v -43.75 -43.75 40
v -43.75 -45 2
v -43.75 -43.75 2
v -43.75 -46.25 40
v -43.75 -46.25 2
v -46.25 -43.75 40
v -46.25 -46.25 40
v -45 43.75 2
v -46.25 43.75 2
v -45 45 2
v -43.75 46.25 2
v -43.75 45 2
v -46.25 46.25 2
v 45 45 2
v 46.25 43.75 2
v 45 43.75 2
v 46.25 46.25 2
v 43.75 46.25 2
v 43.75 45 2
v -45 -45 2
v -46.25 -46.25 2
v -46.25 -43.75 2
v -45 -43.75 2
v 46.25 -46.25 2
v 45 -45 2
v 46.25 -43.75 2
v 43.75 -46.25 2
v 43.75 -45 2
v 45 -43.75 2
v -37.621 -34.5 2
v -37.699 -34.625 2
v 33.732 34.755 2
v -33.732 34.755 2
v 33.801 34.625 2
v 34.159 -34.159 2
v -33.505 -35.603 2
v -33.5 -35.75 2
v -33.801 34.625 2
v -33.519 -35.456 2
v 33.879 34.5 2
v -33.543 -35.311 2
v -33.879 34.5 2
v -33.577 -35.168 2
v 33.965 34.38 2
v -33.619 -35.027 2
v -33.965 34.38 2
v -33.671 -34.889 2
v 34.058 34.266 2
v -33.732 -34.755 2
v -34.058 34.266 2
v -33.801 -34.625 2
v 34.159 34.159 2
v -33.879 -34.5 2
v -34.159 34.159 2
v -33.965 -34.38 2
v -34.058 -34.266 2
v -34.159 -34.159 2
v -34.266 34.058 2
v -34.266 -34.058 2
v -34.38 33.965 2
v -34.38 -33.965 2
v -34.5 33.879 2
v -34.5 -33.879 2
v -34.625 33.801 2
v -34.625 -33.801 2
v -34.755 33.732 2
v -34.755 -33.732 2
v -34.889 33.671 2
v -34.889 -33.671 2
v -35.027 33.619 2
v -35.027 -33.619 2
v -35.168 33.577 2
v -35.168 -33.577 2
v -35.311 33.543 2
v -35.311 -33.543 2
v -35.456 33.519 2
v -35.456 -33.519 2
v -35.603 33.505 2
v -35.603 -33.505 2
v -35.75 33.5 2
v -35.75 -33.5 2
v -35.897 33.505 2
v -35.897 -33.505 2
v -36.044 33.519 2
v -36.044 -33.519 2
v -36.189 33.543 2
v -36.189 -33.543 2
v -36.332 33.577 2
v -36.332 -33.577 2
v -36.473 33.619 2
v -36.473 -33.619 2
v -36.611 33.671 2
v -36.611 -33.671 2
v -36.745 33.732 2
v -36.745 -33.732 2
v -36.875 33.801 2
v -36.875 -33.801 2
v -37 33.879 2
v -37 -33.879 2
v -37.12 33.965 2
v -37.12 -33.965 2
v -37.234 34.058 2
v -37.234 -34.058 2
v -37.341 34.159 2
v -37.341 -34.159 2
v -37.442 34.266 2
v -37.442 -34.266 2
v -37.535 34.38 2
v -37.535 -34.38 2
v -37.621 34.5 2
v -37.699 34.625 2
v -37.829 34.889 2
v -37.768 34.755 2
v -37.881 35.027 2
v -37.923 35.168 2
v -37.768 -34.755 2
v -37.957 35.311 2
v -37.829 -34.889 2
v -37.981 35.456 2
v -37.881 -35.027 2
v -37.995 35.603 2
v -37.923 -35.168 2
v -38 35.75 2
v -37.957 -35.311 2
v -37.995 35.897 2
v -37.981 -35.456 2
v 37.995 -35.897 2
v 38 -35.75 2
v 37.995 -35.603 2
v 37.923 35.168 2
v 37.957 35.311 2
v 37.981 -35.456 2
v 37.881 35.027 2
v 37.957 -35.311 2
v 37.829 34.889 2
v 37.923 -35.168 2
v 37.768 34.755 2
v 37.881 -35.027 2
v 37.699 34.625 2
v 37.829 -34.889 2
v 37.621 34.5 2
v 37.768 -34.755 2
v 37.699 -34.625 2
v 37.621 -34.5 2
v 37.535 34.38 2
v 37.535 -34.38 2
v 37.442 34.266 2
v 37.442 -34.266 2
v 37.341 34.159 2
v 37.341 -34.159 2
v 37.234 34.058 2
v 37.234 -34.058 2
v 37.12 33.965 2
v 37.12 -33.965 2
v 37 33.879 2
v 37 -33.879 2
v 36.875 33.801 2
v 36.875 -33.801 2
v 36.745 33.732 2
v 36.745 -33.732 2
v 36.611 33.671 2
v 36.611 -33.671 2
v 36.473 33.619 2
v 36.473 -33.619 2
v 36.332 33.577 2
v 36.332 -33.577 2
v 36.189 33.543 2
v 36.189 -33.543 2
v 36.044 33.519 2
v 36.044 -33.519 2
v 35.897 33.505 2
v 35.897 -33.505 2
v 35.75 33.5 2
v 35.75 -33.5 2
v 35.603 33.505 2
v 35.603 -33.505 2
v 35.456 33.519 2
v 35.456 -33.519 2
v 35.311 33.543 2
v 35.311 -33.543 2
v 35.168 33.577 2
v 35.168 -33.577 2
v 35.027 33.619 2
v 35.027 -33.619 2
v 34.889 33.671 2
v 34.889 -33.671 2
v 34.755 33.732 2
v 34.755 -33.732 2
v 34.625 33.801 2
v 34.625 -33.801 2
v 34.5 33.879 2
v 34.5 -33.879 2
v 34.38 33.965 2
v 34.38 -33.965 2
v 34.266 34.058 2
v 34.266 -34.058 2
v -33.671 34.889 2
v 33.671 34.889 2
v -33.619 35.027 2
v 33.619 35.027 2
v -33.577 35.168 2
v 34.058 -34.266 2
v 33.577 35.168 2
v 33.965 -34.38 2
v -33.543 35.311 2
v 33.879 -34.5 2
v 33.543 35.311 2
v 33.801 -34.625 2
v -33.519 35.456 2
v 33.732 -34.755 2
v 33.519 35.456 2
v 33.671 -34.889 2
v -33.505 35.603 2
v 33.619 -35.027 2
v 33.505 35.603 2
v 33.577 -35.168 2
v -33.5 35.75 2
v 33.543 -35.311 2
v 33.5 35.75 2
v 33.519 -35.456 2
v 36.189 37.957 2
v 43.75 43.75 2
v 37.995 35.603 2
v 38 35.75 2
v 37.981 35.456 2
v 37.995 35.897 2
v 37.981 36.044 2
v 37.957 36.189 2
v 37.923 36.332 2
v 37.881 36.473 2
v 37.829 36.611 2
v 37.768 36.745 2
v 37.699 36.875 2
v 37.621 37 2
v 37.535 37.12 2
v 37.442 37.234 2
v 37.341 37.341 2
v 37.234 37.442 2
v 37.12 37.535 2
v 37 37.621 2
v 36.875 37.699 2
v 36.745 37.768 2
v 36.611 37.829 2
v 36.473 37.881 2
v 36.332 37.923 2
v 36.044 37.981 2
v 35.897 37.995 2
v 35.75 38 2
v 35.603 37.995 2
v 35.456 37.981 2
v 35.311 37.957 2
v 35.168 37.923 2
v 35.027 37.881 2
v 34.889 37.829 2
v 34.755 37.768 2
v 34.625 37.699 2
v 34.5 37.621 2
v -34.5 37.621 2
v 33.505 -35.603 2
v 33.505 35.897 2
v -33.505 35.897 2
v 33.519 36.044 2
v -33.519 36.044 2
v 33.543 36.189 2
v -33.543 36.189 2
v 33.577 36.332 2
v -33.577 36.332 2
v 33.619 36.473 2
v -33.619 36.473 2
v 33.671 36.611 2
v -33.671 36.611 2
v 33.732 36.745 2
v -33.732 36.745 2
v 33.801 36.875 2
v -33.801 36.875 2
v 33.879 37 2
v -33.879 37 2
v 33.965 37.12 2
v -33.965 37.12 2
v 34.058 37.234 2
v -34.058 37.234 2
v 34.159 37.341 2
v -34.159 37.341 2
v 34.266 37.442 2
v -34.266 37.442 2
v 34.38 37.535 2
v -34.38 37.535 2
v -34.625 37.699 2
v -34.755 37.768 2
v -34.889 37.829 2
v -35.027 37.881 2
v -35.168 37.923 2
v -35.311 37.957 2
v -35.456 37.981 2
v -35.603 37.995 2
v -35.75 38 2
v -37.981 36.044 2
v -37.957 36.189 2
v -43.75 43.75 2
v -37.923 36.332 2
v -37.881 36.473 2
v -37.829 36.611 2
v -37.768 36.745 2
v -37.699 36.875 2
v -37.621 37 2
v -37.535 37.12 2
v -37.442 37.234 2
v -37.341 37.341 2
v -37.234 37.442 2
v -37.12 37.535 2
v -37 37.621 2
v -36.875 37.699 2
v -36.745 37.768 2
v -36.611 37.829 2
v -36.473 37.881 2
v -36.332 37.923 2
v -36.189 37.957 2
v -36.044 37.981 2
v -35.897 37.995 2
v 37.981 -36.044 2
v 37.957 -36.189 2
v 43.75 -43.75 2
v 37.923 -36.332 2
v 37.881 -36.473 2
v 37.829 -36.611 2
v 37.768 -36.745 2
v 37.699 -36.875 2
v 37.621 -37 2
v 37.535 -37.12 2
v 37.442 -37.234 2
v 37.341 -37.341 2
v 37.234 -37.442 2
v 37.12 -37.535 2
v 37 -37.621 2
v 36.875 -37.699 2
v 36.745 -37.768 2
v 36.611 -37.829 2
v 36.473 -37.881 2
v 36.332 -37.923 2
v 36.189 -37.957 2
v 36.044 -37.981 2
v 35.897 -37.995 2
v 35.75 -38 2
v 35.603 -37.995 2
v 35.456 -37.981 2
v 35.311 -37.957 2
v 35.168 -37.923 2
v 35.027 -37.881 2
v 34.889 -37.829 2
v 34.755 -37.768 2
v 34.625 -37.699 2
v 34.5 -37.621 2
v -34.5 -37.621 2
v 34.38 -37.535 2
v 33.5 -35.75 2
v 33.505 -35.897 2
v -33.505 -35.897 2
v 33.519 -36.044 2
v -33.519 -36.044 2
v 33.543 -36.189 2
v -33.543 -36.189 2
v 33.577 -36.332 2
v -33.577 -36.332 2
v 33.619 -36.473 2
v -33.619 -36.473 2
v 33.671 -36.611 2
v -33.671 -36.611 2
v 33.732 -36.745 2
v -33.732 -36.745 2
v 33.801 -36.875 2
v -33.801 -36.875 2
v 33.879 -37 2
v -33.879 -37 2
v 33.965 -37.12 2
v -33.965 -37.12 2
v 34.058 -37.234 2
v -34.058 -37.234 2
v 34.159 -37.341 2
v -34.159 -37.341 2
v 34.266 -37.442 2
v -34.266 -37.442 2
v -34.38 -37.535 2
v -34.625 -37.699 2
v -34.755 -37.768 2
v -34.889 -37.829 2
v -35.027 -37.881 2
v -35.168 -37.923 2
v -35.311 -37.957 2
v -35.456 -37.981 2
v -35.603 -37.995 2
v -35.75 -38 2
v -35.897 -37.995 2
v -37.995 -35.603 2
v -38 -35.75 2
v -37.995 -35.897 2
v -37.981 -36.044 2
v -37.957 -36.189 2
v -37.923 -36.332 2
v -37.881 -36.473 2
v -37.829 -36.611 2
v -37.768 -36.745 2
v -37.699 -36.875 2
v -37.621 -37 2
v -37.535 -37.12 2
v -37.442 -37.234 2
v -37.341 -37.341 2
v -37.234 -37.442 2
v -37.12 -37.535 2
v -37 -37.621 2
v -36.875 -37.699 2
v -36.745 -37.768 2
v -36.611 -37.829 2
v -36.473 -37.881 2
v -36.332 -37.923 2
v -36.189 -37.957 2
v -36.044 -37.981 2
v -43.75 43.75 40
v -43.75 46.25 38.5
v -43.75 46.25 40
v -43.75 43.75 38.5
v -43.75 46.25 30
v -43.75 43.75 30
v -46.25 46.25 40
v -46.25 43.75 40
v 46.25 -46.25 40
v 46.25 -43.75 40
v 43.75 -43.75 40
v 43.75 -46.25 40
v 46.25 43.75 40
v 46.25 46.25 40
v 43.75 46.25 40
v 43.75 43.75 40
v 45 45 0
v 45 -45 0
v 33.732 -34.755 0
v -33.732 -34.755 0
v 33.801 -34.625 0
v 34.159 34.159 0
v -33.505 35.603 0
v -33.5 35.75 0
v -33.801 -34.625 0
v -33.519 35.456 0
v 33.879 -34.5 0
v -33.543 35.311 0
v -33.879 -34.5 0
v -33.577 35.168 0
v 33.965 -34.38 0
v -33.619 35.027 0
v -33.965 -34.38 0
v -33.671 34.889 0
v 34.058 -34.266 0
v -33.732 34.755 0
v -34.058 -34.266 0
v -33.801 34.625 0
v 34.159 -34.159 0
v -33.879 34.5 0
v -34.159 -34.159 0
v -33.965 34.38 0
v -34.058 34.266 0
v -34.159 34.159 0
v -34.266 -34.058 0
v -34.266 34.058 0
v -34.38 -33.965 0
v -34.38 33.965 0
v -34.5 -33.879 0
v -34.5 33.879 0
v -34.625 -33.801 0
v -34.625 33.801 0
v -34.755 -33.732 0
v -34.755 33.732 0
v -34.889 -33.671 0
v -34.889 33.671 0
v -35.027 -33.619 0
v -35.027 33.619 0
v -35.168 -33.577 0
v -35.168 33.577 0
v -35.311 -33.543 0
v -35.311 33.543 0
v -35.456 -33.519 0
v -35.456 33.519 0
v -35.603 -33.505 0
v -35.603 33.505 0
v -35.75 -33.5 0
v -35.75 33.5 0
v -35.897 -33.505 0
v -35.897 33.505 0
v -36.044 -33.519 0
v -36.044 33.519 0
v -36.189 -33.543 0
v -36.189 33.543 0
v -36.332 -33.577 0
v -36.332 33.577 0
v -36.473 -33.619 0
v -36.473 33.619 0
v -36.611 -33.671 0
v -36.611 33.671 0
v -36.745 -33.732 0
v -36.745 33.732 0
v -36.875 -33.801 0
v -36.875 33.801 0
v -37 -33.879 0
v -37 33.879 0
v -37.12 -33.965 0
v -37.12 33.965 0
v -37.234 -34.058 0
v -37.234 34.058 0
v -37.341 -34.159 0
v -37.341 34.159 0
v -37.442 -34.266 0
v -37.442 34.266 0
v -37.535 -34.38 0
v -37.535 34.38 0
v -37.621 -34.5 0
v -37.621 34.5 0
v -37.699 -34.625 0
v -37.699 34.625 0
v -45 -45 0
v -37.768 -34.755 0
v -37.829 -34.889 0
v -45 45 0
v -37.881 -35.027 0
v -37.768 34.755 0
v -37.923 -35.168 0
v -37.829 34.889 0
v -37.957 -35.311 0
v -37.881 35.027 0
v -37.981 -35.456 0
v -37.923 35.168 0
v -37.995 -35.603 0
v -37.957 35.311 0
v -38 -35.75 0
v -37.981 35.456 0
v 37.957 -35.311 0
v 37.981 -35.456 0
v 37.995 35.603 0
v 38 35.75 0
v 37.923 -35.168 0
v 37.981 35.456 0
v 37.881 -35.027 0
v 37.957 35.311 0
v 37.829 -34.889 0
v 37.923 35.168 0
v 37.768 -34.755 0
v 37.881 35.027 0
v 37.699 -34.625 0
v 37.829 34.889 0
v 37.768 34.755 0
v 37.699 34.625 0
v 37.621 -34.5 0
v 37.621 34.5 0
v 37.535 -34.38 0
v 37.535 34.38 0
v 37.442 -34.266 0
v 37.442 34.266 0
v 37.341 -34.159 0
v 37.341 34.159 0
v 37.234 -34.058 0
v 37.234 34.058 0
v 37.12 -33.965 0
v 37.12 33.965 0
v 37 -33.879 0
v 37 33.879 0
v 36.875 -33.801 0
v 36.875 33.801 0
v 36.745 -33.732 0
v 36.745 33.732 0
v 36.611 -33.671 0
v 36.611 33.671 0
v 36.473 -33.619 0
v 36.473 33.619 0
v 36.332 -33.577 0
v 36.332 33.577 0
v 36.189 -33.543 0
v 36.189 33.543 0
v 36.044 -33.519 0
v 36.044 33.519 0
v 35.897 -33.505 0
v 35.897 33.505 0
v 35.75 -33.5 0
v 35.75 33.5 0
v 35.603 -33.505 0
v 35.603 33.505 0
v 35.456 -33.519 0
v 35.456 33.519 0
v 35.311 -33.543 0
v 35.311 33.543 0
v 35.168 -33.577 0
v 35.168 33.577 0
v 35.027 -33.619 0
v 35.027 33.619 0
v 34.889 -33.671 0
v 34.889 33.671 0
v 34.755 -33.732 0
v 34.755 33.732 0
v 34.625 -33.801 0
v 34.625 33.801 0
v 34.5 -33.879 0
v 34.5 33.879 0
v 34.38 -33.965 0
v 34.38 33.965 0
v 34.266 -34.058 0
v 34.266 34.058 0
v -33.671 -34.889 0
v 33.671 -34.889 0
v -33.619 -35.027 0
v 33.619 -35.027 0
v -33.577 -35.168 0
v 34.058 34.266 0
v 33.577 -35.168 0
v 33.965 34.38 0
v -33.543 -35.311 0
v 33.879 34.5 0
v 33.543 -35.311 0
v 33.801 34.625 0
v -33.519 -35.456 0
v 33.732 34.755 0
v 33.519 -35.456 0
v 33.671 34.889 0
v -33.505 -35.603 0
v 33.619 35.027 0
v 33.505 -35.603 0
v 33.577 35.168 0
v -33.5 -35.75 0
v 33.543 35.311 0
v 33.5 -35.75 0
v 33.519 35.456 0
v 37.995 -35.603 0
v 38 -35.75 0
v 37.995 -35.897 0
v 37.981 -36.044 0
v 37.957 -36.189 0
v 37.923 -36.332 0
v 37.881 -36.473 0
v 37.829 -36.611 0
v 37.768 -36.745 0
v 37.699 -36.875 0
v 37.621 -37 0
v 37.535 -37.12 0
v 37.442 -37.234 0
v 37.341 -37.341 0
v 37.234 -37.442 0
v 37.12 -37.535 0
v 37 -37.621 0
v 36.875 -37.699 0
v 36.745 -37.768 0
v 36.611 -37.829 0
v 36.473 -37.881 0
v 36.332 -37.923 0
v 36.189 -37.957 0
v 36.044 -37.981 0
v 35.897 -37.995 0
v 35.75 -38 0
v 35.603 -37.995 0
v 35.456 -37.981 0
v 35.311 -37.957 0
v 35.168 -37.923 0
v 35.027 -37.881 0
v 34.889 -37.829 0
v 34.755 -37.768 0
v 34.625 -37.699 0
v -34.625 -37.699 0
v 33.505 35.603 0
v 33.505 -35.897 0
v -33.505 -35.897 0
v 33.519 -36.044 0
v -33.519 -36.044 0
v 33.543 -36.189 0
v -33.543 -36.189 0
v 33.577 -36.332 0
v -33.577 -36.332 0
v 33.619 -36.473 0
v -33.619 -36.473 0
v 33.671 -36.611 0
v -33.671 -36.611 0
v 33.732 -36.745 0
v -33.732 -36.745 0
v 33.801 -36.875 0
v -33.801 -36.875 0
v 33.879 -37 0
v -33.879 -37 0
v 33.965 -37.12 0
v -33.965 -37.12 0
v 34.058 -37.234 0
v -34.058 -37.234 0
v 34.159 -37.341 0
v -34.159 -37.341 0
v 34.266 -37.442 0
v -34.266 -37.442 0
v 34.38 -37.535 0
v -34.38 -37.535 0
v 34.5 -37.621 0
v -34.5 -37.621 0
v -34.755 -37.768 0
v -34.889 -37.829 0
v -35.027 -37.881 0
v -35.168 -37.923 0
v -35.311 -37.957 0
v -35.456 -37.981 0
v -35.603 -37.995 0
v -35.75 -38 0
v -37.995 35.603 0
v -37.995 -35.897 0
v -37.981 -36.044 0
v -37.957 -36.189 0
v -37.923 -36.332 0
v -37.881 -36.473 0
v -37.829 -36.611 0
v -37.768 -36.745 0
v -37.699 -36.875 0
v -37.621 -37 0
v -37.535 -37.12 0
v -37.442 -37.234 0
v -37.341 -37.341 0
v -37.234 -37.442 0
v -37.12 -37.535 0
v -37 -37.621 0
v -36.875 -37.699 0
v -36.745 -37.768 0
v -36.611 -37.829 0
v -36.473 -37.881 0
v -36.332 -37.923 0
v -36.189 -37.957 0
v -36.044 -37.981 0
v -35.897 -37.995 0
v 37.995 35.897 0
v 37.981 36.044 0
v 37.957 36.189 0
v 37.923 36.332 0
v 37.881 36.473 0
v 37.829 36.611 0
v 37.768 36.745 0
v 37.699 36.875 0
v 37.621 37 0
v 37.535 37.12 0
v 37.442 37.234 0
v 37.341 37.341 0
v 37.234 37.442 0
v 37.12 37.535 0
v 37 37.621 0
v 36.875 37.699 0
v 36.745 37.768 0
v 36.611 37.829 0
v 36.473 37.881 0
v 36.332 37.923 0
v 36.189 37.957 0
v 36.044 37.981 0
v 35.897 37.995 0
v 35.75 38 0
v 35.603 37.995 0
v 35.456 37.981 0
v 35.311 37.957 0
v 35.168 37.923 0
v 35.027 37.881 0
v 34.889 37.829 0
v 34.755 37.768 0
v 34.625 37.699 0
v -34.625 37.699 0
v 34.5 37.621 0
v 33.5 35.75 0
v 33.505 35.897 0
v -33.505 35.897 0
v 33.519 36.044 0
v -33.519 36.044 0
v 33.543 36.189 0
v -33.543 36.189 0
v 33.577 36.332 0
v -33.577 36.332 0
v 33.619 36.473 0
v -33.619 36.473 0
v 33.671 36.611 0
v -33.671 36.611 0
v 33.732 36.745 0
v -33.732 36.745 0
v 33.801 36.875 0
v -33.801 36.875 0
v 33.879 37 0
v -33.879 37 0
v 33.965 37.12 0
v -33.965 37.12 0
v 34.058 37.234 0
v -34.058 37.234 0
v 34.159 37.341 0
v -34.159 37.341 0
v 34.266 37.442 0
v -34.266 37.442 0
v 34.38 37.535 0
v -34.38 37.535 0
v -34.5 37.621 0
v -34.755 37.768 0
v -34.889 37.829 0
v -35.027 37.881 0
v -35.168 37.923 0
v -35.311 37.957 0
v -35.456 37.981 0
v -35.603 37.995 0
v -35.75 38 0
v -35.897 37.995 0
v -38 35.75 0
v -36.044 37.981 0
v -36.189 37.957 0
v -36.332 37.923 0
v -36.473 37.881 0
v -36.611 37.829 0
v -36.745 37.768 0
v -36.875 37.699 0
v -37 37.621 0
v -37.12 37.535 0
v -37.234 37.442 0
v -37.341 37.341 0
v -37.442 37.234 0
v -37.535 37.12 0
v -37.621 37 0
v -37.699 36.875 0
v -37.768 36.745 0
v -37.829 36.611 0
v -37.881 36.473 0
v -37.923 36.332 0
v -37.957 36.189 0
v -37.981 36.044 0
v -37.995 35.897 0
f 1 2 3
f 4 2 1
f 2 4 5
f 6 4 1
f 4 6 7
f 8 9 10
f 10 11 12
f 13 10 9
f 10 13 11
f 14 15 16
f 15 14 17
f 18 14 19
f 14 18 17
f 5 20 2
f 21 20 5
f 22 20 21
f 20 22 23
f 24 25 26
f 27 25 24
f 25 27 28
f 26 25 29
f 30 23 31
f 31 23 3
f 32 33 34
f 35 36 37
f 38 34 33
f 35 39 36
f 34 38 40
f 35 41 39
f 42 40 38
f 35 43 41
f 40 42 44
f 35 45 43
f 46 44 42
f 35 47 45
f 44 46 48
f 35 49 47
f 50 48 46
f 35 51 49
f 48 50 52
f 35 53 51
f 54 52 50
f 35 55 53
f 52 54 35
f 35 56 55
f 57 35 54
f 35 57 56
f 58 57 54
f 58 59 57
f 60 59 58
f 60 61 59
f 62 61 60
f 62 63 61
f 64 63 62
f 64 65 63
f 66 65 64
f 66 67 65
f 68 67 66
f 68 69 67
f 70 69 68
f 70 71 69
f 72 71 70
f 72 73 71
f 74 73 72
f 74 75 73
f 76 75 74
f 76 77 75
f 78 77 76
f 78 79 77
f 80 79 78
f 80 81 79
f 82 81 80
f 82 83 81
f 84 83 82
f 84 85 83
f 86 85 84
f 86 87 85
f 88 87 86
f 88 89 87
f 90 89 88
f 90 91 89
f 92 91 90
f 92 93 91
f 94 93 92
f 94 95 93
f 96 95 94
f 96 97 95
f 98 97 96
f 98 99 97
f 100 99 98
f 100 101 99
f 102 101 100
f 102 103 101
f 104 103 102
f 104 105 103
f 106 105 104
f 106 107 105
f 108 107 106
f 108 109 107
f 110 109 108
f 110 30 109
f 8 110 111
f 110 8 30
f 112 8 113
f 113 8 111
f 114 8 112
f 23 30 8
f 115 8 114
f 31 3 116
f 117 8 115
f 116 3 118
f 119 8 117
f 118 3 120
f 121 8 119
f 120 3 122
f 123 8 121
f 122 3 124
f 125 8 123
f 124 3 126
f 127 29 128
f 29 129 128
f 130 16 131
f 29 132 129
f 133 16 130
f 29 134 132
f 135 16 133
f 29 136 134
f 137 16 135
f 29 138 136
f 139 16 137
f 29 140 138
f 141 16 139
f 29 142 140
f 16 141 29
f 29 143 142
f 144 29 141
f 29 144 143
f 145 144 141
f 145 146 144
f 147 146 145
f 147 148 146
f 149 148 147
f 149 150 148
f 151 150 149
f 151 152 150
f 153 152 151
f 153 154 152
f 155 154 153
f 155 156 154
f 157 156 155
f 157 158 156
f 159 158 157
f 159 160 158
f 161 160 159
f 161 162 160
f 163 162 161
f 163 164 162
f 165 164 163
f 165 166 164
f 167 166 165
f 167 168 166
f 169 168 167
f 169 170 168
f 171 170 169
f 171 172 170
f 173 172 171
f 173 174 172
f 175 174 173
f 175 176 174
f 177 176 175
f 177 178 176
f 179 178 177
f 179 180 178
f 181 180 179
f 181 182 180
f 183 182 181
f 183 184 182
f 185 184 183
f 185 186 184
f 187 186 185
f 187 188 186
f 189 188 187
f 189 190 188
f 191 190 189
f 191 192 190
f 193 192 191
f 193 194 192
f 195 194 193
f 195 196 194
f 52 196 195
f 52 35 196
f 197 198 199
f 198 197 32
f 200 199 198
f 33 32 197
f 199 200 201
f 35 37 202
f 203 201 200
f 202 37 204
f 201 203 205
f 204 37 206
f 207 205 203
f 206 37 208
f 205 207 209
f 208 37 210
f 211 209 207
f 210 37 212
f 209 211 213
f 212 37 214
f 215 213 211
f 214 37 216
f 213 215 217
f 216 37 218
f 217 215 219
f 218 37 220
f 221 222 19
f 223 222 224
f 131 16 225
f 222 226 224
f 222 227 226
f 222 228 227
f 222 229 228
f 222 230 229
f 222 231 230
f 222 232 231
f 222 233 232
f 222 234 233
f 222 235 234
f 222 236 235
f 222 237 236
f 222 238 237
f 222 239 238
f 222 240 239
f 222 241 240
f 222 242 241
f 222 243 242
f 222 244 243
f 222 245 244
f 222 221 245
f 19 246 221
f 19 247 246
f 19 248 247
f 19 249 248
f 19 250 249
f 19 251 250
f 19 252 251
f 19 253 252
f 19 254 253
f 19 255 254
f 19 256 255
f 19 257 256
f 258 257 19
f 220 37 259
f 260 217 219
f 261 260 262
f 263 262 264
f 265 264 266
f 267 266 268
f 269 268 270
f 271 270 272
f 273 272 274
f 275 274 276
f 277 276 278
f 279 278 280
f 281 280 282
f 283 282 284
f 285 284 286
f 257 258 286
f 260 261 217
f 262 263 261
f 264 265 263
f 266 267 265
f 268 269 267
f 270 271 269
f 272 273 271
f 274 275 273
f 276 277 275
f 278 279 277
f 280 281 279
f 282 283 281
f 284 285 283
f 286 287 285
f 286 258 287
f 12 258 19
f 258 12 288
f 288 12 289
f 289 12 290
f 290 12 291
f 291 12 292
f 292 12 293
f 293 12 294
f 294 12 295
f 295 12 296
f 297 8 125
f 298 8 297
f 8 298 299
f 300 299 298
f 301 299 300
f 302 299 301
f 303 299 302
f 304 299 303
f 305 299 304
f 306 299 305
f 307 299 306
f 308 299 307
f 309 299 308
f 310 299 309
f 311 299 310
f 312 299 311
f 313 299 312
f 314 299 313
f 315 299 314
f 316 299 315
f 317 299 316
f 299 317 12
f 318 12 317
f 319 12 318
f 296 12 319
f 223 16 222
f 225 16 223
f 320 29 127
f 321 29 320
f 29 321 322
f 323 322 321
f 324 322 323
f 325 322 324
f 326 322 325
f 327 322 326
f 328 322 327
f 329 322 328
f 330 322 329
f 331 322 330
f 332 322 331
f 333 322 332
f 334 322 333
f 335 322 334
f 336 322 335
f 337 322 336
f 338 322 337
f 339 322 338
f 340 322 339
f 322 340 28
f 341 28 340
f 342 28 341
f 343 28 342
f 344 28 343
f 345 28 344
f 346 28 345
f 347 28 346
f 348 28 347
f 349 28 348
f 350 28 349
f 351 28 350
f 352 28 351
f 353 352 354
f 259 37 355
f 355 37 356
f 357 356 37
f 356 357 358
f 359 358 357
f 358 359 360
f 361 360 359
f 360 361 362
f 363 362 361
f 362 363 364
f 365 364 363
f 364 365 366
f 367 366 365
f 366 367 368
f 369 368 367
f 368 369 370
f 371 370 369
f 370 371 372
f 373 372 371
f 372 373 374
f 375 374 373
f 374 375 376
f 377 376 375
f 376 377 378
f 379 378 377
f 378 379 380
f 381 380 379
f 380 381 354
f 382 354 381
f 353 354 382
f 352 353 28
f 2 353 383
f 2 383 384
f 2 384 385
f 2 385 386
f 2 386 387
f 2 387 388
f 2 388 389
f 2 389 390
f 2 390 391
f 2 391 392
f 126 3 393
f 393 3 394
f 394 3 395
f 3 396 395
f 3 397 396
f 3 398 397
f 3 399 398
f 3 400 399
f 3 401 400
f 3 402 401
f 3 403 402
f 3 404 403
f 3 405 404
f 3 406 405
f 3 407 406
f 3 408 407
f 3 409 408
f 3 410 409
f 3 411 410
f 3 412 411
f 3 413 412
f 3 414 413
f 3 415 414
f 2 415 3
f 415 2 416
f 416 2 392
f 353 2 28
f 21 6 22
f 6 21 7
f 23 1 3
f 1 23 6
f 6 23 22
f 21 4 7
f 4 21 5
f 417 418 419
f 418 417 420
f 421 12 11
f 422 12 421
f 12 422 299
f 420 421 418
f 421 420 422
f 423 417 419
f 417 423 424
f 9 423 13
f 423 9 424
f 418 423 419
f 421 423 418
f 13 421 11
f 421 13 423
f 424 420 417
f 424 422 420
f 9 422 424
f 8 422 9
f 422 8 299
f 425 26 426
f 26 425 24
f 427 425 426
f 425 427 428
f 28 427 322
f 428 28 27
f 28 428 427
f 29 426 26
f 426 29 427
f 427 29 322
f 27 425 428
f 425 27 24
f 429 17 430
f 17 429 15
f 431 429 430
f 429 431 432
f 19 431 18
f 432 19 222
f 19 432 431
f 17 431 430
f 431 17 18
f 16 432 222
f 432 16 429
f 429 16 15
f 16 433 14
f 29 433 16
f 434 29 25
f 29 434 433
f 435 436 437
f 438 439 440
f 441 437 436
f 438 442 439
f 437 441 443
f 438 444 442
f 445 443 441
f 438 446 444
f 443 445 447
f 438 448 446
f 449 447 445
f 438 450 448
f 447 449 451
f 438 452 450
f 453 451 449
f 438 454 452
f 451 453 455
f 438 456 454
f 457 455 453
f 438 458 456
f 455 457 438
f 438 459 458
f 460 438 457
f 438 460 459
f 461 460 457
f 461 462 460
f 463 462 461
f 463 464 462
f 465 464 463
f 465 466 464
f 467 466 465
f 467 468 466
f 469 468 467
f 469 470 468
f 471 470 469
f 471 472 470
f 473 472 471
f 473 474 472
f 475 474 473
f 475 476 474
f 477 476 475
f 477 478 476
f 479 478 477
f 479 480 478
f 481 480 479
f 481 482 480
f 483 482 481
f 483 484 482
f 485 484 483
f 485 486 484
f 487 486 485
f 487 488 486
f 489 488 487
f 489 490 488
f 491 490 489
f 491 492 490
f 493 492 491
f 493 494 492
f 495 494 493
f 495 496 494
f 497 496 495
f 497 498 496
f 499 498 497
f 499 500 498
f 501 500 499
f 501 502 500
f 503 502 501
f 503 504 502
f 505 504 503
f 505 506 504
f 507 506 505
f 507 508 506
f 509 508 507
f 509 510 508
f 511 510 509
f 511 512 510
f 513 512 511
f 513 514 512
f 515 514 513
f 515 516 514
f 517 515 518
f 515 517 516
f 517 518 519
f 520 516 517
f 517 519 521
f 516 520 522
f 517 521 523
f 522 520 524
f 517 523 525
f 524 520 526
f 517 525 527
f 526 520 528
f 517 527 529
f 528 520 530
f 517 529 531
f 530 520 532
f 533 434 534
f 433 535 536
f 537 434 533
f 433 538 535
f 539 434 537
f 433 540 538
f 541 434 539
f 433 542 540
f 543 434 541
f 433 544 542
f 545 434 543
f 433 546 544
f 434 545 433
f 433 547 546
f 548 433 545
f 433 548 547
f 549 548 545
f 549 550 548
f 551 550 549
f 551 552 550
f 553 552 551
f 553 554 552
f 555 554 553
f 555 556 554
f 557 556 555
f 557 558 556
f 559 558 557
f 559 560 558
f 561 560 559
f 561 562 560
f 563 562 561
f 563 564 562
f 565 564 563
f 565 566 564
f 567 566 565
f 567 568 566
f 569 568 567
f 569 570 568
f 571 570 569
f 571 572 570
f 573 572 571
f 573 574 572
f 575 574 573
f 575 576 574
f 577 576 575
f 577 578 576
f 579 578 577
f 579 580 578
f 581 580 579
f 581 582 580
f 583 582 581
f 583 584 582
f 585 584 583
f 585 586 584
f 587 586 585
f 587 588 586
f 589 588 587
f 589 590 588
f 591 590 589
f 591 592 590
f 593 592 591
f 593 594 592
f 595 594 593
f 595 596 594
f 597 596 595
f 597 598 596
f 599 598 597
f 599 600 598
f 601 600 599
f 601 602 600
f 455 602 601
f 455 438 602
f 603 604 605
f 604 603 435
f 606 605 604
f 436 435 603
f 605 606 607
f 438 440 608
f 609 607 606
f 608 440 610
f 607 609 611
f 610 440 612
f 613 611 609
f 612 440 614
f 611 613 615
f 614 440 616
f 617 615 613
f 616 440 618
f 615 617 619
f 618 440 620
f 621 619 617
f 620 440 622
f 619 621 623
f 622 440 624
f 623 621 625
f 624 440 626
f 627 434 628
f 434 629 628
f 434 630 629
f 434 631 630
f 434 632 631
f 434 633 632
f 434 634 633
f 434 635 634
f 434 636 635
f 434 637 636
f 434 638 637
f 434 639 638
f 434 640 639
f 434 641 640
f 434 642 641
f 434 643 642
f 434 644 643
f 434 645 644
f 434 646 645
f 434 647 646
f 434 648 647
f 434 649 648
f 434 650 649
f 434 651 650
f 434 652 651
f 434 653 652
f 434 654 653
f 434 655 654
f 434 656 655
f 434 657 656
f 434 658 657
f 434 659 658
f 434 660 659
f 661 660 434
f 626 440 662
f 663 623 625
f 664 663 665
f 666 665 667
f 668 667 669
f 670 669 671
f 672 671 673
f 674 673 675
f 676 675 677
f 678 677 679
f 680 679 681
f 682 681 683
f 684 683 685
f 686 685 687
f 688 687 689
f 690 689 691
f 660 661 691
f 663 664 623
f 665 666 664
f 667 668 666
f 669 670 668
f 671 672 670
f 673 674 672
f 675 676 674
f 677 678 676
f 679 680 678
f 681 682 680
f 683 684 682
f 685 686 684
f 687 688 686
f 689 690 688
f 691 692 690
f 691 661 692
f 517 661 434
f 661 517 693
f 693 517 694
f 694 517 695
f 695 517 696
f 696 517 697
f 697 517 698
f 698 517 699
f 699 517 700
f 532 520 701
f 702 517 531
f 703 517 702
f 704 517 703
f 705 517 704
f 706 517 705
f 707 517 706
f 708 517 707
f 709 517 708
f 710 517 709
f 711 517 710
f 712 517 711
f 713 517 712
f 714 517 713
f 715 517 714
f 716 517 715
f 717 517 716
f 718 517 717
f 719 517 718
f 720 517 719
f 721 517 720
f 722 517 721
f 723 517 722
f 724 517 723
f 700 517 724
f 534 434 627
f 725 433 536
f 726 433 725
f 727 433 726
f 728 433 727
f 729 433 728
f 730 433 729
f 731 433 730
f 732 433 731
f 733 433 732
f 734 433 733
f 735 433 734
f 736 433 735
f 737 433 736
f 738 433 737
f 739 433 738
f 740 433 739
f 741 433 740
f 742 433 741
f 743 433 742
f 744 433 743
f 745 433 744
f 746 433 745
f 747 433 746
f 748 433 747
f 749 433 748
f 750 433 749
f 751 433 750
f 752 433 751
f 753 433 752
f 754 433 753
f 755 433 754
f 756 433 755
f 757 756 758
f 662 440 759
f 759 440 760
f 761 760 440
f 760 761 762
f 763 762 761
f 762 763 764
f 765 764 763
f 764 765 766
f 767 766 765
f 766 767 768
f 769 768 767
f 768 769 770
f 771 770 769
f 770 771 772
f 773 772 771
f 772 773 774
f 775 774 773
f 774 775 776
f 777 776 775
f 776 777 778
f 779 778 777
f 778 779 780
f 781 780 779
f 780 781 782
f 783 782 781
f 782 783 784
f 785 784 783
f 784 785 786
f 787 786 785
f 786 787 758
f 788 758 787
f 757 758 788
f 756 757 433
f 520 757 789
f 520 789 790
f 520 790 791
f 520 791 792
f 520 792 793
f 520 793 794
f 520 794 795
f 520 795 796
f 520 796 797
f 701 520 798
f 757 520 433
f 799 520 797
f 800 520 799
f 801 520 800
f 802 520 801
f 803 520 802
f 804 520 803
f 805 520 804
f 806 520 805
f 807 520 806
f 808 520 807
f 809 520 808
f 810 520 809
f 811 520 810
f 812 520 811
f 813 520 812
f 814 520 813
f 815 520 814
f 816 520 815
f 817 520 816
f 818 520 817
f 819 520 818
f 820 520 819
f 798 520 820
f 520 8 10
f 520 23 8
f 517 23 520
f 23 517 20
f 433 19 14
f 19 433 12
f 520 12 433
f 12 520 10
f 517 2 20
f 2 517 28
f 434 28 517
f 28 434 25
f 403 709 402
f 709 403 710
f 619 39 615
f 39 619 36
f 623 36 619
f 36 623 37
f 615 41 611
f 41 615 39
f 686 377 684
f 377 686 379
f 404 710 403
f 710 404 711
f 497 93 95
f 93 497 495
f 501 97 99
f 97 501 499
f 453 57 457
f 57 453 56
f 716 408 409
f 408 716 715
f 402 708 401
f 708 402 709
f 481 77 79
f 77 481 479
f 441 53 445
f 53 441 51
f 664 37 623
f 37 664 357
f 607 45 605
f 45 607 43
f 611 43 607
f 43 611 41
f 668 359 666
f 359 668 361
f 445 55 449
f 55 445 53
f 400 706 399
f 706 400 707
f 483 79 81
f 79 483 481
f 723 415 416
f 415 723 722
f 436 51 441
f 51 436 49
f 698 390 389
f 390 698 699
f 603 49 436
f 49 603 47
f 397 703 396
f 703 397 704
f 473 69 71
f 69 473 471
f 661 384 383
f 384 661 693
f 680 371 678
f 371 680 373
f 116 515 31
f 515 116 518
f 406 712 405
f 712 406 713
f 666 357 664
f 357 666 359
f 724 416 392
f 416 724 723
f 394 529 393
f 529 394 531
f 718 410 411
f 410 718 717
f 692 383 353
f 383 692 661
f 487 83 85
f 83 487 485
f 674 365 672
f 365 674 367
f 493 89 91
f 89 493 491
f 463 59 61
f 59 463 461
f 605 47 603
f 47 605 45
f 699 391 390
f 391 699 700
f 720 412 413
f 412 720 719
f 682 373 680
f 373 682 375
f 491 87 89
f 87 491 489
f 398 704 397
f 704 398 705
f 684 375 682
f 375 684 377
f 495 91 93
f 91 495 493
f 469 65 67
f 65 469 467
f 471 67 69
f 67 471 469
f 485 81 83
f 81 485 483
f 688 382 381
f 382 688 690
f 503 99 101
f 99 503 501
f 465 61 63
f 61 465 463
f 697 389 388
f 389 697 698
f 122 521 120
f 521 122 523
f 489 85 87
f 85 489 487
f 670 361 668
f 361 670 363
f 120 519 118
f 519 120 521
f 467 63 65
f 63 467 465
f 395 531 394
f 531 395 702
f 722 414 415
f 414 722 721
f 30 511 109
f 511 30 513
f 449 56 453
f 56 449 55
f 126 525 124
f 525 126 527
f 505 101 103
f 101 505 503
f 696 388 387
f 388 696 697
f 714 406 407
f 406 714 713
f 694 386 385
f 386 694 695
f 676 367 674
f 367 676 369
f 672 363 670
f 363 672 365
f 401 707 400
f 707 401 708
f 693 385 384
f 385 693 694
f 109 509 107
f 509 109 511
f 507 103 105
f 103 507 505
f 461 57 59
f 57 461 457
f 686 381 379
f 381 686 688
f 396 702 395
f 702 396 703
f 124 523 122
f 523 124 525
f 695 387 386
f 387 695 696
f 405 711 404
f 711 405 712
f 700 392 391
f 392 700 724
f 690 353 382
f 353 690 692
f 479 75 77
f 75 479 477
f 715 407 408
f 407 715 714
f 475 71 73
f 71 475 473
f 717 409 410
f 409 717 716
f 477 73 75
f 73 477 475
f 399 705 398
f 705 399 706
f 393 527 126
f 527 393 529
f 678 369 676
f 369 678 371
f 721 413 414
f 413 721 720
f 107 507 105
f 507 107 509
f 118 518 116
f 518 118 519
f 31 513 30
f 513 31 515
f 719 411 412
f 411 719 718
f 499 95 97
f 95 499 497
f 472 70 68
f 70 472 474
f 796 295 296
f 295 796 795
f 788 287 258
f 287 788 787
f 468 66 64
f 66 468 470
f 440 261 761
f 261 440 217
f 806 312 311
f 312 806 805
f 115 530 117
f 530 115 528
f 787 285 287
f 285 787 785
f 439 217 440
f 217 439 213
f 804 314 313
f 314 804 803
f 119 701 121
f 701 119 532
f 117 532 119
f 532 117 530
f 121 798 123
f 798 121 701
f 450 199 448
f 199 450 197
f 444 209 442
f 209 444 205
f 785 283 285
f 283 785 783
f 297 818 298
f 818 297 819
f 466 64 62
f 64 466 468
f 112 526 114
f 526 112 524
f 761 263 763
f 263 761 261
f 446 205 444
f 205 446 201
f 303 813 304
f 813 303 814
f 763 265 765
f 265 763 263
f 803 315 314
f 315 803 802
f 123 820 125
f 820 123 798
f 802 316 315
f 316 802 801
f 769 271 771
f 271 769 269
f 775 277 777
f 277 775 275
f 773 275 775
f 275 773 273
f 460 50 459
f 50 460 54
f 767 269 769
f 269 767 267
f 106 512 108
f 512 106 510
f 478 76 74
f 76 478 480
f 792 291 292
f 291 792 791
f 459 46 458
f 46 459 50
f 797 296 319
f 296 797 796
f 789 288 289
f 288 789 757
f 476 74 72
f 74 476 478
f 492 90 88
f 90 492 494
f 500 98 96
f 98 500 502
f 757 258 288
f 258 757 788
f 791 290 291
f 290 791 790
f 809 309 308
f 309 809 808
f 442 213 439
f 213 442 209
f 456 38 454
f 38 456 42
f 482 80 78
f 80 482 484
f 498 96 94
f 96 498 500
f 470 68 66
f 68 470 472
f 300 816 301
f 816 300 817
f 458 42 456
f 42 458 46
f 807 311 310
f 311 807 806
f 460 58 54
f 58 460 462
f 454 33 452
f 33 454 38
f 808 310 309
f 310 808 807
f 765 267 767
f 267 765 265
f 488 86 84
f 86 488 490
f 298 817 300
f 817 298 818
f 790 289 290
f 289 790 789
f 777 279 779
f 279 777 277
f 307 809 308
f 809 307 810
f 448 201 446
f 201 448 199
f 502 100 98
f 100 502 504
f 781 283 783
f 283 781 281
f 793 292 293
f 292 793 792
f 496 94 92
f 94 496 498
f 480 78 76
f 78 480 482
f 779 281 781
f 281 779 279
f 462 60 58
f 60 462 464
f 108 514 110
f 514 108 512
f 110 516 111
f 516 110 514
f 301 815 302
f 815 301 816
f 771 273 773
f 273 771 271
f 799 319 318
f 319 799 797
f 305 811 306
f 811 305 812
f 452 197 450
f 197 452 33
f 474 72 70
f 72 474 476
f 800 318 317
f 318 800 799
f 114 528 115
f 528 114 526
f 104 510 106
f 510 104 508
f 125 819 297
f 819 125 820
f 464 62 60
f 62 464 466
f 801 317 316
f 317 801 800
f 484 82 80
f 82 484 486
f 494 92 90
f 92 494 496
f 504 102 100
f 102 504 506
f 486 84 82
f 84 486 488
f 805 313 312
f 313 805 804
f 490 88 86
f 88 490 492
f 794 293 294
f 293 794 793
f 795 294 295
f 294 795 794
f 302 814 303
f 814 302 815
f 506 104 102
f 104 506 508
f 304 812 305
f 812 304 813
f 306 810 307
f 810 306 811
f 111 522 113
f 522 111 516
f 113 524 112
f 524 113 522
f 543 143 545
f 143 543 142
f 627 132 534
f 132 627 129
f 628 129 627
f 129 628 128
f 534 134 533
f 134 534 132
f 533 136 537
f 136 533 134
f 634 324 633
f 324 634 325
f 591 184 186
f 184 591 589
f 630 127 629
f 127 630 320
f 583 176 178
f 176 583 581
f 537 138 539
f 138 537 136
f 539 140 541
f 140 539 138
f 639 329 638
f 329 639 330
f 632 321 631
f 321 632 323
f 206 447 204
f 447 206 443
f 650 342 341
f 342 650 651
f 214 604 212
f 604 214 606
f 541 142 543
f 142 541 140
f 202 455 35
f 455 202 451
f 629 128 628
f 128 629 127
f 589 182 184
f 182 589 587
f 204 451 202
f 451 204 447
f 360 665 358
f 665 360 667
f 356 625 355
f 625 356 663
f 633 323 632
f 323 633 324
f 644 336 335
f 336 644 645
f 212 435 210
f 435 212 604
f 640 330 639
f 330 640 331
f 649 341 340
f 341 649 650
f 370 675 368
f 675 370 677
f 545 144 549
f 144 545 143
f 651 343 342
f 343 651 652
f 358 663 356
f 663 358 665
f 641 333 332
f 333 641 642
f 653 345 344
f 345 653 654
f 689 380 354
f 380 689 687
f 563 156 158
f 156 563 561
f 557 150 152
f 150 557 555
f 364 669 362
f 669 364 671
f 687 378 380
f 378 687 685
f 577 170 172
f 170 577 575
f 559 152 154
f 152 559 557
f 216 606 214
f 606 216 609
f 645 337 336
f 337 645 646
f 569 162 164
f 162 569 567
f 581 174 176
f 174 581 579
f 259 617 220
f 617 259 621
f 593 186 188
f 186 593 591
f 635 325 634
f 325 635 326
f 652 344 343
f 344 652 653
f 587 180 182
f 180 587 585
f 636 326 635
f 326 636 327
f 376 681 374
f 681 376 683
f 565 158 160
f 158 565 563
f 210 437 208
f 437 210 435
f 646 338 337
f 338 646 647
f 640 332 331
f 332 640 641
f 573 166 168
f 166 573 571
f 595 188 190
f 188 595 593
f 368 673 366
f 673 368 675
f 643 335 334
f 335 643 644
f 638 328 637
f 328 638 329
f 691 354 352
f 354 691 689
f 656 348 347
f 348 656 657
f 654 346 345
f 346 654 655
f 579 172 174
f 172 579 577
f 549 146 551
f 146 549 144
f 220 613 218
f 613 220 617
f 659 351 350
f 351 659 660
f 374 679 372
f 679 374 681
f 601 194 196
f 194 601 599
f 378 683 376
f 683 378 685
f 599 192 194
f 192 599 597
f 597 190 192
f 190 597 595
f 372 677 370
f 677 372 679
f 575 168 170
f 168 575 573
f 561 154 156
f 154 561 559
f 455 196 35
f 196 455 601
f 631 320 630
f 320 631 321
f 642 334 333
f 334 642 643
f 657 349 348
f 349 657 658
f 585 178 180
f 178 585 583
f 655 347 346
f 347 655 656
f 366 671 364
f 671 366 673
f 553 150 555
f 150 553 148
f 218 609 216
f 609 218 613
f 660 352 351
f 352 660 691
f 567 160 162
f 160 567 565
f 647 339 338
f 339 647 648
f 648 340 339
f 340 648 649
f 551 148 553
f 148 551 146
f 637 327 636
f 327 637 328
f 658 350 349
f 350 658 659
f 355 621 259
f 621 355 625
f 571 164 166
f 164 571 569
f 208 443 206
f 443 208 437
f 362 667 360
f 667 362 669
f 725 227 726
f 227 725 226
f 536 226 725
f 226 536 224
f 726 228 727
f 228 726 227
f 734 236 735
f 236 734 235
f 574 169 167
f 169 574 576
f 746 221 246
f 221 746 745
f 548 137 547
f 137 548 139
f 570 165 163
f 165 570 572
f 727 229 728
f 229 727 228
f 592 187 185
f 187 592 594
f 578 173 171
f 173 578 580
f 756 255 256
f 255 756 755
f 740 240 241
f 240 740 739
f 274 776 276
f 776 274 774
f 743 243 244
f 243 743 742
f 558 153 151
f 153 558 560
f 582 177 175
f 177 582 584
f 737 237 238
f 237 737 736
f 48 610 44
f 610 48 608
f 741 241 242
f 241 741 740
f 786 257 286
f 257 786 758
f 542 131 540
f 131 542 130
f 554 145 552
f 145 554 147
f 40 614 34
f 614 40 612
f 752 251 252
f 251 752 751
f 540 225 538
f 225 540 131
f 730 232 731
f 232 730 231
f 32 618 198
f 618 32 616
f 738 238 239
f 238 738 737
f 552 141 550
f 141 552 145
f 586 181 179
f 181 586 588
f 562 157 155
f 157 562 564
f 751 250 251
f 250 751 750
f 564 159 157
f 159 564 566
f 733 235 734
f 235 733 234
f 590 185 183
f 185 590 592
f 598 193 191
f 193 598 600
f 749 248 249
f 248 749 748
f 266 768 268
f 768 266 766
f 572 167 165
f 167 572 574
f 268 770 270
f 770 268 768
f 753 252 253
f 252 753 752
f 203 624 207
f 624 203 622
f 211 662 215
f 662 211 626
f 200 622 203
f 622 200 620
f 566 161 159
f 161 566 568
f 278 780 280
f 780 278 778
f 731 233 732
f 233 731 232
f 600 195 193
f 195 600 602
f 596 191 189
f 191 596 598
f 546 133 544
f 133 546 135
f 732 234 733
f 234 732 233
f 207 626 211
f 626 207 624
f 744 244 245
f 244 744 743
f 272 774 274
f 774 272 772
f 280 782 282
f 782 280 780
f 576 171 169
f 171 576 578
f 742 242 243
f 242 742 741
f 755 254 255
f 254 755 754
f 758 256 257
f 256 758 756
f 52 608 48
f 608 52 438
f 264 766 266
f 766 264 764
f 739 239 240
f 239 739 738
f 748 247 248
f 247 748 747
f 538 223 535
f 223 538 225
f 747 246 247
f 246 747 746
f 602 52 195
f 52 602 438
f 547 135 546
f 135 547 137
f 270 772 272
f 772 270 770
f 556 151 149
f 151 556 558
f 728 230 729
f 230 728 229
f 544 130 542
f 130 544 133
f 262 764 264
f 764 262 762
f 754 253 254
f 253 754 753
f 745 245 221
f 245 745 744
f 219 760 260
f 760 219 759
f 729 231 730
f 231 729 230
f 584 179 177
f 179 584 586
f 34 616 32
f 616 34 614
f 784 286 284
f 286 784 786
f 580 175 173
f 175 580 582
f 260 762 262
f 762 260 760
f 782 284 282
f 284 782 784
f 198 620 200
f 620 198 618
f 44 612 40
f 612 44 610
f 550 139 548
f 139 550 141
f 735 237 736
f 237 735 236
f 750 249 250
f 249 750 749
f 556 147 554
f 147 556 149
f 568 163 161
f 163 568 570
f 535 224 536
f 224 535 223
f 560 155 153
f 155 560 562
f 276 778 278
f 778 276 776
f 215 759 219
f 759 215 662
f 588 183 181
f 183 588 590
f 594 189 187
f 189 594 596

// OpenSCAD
// DIY magnetic stirrer housing - print orientation (upside down)
// Units: mm

// ---------- Parameters ----------
top_thickness      = 2;     // top plate thickness (z = 0 to 2)
wall_thickness     = 2.5;   // wall thickness
box_height         = 40;    // total height of box (open at top)
outer_size         = 90;    // outer X and Y size of box
screw_hole_d       = 4.5;   // M4 screw hole diameter
screw_hole_pitch   = 71.5;  // square pattern size for screw holes
cable_notch_w      = 12;    // cable notch width
cable_notch_depth  = 8;     // cable notch depth from open edge (z = 32 to 40)
eps                = 0.5;   // overcut for clean boolean differences
$fn                = 96;    // curve resolution

// ---------- Model ----------
difference() {
    union() {
        // Top plate (lies on bed)
        translate([-outer_size/2, -outer_size/2, 0])
            cube([outer_size, outer_size, top_thickness]);

        // Four walls rising from plate to open top
        for (x = [-outer_size/2, outer_size/2])
            for (y = [-outer_size/2, outer_size/2])
                translate([x - wall_thickness/2, y - wall_thickness/2, top_thickness])
                    cube([wall_thickness, wall_thickness, box_height - top_thickness]);
    }

    // Four M4 screw holes through top plate, centred square pattern
    for (x = [-screw_hole_pitch/2, screw_hole_pitch/2])
        for (y = [-screw_hole_pitch/2, screw_hole_pitch/2])
            translate([x, y, -eps])
                cylinder(d = screw_hole_d, h = top_thickness + 2*eps);

    // Cable notch in one wall, centred along the wall
    translate([-outer_size/2 + wall_thickness/2, 0, box_height - top_thickness - cable_notch_depth])
        cube([cable_notch_w, outer_size, cable_notch_depth + eps]);
}
